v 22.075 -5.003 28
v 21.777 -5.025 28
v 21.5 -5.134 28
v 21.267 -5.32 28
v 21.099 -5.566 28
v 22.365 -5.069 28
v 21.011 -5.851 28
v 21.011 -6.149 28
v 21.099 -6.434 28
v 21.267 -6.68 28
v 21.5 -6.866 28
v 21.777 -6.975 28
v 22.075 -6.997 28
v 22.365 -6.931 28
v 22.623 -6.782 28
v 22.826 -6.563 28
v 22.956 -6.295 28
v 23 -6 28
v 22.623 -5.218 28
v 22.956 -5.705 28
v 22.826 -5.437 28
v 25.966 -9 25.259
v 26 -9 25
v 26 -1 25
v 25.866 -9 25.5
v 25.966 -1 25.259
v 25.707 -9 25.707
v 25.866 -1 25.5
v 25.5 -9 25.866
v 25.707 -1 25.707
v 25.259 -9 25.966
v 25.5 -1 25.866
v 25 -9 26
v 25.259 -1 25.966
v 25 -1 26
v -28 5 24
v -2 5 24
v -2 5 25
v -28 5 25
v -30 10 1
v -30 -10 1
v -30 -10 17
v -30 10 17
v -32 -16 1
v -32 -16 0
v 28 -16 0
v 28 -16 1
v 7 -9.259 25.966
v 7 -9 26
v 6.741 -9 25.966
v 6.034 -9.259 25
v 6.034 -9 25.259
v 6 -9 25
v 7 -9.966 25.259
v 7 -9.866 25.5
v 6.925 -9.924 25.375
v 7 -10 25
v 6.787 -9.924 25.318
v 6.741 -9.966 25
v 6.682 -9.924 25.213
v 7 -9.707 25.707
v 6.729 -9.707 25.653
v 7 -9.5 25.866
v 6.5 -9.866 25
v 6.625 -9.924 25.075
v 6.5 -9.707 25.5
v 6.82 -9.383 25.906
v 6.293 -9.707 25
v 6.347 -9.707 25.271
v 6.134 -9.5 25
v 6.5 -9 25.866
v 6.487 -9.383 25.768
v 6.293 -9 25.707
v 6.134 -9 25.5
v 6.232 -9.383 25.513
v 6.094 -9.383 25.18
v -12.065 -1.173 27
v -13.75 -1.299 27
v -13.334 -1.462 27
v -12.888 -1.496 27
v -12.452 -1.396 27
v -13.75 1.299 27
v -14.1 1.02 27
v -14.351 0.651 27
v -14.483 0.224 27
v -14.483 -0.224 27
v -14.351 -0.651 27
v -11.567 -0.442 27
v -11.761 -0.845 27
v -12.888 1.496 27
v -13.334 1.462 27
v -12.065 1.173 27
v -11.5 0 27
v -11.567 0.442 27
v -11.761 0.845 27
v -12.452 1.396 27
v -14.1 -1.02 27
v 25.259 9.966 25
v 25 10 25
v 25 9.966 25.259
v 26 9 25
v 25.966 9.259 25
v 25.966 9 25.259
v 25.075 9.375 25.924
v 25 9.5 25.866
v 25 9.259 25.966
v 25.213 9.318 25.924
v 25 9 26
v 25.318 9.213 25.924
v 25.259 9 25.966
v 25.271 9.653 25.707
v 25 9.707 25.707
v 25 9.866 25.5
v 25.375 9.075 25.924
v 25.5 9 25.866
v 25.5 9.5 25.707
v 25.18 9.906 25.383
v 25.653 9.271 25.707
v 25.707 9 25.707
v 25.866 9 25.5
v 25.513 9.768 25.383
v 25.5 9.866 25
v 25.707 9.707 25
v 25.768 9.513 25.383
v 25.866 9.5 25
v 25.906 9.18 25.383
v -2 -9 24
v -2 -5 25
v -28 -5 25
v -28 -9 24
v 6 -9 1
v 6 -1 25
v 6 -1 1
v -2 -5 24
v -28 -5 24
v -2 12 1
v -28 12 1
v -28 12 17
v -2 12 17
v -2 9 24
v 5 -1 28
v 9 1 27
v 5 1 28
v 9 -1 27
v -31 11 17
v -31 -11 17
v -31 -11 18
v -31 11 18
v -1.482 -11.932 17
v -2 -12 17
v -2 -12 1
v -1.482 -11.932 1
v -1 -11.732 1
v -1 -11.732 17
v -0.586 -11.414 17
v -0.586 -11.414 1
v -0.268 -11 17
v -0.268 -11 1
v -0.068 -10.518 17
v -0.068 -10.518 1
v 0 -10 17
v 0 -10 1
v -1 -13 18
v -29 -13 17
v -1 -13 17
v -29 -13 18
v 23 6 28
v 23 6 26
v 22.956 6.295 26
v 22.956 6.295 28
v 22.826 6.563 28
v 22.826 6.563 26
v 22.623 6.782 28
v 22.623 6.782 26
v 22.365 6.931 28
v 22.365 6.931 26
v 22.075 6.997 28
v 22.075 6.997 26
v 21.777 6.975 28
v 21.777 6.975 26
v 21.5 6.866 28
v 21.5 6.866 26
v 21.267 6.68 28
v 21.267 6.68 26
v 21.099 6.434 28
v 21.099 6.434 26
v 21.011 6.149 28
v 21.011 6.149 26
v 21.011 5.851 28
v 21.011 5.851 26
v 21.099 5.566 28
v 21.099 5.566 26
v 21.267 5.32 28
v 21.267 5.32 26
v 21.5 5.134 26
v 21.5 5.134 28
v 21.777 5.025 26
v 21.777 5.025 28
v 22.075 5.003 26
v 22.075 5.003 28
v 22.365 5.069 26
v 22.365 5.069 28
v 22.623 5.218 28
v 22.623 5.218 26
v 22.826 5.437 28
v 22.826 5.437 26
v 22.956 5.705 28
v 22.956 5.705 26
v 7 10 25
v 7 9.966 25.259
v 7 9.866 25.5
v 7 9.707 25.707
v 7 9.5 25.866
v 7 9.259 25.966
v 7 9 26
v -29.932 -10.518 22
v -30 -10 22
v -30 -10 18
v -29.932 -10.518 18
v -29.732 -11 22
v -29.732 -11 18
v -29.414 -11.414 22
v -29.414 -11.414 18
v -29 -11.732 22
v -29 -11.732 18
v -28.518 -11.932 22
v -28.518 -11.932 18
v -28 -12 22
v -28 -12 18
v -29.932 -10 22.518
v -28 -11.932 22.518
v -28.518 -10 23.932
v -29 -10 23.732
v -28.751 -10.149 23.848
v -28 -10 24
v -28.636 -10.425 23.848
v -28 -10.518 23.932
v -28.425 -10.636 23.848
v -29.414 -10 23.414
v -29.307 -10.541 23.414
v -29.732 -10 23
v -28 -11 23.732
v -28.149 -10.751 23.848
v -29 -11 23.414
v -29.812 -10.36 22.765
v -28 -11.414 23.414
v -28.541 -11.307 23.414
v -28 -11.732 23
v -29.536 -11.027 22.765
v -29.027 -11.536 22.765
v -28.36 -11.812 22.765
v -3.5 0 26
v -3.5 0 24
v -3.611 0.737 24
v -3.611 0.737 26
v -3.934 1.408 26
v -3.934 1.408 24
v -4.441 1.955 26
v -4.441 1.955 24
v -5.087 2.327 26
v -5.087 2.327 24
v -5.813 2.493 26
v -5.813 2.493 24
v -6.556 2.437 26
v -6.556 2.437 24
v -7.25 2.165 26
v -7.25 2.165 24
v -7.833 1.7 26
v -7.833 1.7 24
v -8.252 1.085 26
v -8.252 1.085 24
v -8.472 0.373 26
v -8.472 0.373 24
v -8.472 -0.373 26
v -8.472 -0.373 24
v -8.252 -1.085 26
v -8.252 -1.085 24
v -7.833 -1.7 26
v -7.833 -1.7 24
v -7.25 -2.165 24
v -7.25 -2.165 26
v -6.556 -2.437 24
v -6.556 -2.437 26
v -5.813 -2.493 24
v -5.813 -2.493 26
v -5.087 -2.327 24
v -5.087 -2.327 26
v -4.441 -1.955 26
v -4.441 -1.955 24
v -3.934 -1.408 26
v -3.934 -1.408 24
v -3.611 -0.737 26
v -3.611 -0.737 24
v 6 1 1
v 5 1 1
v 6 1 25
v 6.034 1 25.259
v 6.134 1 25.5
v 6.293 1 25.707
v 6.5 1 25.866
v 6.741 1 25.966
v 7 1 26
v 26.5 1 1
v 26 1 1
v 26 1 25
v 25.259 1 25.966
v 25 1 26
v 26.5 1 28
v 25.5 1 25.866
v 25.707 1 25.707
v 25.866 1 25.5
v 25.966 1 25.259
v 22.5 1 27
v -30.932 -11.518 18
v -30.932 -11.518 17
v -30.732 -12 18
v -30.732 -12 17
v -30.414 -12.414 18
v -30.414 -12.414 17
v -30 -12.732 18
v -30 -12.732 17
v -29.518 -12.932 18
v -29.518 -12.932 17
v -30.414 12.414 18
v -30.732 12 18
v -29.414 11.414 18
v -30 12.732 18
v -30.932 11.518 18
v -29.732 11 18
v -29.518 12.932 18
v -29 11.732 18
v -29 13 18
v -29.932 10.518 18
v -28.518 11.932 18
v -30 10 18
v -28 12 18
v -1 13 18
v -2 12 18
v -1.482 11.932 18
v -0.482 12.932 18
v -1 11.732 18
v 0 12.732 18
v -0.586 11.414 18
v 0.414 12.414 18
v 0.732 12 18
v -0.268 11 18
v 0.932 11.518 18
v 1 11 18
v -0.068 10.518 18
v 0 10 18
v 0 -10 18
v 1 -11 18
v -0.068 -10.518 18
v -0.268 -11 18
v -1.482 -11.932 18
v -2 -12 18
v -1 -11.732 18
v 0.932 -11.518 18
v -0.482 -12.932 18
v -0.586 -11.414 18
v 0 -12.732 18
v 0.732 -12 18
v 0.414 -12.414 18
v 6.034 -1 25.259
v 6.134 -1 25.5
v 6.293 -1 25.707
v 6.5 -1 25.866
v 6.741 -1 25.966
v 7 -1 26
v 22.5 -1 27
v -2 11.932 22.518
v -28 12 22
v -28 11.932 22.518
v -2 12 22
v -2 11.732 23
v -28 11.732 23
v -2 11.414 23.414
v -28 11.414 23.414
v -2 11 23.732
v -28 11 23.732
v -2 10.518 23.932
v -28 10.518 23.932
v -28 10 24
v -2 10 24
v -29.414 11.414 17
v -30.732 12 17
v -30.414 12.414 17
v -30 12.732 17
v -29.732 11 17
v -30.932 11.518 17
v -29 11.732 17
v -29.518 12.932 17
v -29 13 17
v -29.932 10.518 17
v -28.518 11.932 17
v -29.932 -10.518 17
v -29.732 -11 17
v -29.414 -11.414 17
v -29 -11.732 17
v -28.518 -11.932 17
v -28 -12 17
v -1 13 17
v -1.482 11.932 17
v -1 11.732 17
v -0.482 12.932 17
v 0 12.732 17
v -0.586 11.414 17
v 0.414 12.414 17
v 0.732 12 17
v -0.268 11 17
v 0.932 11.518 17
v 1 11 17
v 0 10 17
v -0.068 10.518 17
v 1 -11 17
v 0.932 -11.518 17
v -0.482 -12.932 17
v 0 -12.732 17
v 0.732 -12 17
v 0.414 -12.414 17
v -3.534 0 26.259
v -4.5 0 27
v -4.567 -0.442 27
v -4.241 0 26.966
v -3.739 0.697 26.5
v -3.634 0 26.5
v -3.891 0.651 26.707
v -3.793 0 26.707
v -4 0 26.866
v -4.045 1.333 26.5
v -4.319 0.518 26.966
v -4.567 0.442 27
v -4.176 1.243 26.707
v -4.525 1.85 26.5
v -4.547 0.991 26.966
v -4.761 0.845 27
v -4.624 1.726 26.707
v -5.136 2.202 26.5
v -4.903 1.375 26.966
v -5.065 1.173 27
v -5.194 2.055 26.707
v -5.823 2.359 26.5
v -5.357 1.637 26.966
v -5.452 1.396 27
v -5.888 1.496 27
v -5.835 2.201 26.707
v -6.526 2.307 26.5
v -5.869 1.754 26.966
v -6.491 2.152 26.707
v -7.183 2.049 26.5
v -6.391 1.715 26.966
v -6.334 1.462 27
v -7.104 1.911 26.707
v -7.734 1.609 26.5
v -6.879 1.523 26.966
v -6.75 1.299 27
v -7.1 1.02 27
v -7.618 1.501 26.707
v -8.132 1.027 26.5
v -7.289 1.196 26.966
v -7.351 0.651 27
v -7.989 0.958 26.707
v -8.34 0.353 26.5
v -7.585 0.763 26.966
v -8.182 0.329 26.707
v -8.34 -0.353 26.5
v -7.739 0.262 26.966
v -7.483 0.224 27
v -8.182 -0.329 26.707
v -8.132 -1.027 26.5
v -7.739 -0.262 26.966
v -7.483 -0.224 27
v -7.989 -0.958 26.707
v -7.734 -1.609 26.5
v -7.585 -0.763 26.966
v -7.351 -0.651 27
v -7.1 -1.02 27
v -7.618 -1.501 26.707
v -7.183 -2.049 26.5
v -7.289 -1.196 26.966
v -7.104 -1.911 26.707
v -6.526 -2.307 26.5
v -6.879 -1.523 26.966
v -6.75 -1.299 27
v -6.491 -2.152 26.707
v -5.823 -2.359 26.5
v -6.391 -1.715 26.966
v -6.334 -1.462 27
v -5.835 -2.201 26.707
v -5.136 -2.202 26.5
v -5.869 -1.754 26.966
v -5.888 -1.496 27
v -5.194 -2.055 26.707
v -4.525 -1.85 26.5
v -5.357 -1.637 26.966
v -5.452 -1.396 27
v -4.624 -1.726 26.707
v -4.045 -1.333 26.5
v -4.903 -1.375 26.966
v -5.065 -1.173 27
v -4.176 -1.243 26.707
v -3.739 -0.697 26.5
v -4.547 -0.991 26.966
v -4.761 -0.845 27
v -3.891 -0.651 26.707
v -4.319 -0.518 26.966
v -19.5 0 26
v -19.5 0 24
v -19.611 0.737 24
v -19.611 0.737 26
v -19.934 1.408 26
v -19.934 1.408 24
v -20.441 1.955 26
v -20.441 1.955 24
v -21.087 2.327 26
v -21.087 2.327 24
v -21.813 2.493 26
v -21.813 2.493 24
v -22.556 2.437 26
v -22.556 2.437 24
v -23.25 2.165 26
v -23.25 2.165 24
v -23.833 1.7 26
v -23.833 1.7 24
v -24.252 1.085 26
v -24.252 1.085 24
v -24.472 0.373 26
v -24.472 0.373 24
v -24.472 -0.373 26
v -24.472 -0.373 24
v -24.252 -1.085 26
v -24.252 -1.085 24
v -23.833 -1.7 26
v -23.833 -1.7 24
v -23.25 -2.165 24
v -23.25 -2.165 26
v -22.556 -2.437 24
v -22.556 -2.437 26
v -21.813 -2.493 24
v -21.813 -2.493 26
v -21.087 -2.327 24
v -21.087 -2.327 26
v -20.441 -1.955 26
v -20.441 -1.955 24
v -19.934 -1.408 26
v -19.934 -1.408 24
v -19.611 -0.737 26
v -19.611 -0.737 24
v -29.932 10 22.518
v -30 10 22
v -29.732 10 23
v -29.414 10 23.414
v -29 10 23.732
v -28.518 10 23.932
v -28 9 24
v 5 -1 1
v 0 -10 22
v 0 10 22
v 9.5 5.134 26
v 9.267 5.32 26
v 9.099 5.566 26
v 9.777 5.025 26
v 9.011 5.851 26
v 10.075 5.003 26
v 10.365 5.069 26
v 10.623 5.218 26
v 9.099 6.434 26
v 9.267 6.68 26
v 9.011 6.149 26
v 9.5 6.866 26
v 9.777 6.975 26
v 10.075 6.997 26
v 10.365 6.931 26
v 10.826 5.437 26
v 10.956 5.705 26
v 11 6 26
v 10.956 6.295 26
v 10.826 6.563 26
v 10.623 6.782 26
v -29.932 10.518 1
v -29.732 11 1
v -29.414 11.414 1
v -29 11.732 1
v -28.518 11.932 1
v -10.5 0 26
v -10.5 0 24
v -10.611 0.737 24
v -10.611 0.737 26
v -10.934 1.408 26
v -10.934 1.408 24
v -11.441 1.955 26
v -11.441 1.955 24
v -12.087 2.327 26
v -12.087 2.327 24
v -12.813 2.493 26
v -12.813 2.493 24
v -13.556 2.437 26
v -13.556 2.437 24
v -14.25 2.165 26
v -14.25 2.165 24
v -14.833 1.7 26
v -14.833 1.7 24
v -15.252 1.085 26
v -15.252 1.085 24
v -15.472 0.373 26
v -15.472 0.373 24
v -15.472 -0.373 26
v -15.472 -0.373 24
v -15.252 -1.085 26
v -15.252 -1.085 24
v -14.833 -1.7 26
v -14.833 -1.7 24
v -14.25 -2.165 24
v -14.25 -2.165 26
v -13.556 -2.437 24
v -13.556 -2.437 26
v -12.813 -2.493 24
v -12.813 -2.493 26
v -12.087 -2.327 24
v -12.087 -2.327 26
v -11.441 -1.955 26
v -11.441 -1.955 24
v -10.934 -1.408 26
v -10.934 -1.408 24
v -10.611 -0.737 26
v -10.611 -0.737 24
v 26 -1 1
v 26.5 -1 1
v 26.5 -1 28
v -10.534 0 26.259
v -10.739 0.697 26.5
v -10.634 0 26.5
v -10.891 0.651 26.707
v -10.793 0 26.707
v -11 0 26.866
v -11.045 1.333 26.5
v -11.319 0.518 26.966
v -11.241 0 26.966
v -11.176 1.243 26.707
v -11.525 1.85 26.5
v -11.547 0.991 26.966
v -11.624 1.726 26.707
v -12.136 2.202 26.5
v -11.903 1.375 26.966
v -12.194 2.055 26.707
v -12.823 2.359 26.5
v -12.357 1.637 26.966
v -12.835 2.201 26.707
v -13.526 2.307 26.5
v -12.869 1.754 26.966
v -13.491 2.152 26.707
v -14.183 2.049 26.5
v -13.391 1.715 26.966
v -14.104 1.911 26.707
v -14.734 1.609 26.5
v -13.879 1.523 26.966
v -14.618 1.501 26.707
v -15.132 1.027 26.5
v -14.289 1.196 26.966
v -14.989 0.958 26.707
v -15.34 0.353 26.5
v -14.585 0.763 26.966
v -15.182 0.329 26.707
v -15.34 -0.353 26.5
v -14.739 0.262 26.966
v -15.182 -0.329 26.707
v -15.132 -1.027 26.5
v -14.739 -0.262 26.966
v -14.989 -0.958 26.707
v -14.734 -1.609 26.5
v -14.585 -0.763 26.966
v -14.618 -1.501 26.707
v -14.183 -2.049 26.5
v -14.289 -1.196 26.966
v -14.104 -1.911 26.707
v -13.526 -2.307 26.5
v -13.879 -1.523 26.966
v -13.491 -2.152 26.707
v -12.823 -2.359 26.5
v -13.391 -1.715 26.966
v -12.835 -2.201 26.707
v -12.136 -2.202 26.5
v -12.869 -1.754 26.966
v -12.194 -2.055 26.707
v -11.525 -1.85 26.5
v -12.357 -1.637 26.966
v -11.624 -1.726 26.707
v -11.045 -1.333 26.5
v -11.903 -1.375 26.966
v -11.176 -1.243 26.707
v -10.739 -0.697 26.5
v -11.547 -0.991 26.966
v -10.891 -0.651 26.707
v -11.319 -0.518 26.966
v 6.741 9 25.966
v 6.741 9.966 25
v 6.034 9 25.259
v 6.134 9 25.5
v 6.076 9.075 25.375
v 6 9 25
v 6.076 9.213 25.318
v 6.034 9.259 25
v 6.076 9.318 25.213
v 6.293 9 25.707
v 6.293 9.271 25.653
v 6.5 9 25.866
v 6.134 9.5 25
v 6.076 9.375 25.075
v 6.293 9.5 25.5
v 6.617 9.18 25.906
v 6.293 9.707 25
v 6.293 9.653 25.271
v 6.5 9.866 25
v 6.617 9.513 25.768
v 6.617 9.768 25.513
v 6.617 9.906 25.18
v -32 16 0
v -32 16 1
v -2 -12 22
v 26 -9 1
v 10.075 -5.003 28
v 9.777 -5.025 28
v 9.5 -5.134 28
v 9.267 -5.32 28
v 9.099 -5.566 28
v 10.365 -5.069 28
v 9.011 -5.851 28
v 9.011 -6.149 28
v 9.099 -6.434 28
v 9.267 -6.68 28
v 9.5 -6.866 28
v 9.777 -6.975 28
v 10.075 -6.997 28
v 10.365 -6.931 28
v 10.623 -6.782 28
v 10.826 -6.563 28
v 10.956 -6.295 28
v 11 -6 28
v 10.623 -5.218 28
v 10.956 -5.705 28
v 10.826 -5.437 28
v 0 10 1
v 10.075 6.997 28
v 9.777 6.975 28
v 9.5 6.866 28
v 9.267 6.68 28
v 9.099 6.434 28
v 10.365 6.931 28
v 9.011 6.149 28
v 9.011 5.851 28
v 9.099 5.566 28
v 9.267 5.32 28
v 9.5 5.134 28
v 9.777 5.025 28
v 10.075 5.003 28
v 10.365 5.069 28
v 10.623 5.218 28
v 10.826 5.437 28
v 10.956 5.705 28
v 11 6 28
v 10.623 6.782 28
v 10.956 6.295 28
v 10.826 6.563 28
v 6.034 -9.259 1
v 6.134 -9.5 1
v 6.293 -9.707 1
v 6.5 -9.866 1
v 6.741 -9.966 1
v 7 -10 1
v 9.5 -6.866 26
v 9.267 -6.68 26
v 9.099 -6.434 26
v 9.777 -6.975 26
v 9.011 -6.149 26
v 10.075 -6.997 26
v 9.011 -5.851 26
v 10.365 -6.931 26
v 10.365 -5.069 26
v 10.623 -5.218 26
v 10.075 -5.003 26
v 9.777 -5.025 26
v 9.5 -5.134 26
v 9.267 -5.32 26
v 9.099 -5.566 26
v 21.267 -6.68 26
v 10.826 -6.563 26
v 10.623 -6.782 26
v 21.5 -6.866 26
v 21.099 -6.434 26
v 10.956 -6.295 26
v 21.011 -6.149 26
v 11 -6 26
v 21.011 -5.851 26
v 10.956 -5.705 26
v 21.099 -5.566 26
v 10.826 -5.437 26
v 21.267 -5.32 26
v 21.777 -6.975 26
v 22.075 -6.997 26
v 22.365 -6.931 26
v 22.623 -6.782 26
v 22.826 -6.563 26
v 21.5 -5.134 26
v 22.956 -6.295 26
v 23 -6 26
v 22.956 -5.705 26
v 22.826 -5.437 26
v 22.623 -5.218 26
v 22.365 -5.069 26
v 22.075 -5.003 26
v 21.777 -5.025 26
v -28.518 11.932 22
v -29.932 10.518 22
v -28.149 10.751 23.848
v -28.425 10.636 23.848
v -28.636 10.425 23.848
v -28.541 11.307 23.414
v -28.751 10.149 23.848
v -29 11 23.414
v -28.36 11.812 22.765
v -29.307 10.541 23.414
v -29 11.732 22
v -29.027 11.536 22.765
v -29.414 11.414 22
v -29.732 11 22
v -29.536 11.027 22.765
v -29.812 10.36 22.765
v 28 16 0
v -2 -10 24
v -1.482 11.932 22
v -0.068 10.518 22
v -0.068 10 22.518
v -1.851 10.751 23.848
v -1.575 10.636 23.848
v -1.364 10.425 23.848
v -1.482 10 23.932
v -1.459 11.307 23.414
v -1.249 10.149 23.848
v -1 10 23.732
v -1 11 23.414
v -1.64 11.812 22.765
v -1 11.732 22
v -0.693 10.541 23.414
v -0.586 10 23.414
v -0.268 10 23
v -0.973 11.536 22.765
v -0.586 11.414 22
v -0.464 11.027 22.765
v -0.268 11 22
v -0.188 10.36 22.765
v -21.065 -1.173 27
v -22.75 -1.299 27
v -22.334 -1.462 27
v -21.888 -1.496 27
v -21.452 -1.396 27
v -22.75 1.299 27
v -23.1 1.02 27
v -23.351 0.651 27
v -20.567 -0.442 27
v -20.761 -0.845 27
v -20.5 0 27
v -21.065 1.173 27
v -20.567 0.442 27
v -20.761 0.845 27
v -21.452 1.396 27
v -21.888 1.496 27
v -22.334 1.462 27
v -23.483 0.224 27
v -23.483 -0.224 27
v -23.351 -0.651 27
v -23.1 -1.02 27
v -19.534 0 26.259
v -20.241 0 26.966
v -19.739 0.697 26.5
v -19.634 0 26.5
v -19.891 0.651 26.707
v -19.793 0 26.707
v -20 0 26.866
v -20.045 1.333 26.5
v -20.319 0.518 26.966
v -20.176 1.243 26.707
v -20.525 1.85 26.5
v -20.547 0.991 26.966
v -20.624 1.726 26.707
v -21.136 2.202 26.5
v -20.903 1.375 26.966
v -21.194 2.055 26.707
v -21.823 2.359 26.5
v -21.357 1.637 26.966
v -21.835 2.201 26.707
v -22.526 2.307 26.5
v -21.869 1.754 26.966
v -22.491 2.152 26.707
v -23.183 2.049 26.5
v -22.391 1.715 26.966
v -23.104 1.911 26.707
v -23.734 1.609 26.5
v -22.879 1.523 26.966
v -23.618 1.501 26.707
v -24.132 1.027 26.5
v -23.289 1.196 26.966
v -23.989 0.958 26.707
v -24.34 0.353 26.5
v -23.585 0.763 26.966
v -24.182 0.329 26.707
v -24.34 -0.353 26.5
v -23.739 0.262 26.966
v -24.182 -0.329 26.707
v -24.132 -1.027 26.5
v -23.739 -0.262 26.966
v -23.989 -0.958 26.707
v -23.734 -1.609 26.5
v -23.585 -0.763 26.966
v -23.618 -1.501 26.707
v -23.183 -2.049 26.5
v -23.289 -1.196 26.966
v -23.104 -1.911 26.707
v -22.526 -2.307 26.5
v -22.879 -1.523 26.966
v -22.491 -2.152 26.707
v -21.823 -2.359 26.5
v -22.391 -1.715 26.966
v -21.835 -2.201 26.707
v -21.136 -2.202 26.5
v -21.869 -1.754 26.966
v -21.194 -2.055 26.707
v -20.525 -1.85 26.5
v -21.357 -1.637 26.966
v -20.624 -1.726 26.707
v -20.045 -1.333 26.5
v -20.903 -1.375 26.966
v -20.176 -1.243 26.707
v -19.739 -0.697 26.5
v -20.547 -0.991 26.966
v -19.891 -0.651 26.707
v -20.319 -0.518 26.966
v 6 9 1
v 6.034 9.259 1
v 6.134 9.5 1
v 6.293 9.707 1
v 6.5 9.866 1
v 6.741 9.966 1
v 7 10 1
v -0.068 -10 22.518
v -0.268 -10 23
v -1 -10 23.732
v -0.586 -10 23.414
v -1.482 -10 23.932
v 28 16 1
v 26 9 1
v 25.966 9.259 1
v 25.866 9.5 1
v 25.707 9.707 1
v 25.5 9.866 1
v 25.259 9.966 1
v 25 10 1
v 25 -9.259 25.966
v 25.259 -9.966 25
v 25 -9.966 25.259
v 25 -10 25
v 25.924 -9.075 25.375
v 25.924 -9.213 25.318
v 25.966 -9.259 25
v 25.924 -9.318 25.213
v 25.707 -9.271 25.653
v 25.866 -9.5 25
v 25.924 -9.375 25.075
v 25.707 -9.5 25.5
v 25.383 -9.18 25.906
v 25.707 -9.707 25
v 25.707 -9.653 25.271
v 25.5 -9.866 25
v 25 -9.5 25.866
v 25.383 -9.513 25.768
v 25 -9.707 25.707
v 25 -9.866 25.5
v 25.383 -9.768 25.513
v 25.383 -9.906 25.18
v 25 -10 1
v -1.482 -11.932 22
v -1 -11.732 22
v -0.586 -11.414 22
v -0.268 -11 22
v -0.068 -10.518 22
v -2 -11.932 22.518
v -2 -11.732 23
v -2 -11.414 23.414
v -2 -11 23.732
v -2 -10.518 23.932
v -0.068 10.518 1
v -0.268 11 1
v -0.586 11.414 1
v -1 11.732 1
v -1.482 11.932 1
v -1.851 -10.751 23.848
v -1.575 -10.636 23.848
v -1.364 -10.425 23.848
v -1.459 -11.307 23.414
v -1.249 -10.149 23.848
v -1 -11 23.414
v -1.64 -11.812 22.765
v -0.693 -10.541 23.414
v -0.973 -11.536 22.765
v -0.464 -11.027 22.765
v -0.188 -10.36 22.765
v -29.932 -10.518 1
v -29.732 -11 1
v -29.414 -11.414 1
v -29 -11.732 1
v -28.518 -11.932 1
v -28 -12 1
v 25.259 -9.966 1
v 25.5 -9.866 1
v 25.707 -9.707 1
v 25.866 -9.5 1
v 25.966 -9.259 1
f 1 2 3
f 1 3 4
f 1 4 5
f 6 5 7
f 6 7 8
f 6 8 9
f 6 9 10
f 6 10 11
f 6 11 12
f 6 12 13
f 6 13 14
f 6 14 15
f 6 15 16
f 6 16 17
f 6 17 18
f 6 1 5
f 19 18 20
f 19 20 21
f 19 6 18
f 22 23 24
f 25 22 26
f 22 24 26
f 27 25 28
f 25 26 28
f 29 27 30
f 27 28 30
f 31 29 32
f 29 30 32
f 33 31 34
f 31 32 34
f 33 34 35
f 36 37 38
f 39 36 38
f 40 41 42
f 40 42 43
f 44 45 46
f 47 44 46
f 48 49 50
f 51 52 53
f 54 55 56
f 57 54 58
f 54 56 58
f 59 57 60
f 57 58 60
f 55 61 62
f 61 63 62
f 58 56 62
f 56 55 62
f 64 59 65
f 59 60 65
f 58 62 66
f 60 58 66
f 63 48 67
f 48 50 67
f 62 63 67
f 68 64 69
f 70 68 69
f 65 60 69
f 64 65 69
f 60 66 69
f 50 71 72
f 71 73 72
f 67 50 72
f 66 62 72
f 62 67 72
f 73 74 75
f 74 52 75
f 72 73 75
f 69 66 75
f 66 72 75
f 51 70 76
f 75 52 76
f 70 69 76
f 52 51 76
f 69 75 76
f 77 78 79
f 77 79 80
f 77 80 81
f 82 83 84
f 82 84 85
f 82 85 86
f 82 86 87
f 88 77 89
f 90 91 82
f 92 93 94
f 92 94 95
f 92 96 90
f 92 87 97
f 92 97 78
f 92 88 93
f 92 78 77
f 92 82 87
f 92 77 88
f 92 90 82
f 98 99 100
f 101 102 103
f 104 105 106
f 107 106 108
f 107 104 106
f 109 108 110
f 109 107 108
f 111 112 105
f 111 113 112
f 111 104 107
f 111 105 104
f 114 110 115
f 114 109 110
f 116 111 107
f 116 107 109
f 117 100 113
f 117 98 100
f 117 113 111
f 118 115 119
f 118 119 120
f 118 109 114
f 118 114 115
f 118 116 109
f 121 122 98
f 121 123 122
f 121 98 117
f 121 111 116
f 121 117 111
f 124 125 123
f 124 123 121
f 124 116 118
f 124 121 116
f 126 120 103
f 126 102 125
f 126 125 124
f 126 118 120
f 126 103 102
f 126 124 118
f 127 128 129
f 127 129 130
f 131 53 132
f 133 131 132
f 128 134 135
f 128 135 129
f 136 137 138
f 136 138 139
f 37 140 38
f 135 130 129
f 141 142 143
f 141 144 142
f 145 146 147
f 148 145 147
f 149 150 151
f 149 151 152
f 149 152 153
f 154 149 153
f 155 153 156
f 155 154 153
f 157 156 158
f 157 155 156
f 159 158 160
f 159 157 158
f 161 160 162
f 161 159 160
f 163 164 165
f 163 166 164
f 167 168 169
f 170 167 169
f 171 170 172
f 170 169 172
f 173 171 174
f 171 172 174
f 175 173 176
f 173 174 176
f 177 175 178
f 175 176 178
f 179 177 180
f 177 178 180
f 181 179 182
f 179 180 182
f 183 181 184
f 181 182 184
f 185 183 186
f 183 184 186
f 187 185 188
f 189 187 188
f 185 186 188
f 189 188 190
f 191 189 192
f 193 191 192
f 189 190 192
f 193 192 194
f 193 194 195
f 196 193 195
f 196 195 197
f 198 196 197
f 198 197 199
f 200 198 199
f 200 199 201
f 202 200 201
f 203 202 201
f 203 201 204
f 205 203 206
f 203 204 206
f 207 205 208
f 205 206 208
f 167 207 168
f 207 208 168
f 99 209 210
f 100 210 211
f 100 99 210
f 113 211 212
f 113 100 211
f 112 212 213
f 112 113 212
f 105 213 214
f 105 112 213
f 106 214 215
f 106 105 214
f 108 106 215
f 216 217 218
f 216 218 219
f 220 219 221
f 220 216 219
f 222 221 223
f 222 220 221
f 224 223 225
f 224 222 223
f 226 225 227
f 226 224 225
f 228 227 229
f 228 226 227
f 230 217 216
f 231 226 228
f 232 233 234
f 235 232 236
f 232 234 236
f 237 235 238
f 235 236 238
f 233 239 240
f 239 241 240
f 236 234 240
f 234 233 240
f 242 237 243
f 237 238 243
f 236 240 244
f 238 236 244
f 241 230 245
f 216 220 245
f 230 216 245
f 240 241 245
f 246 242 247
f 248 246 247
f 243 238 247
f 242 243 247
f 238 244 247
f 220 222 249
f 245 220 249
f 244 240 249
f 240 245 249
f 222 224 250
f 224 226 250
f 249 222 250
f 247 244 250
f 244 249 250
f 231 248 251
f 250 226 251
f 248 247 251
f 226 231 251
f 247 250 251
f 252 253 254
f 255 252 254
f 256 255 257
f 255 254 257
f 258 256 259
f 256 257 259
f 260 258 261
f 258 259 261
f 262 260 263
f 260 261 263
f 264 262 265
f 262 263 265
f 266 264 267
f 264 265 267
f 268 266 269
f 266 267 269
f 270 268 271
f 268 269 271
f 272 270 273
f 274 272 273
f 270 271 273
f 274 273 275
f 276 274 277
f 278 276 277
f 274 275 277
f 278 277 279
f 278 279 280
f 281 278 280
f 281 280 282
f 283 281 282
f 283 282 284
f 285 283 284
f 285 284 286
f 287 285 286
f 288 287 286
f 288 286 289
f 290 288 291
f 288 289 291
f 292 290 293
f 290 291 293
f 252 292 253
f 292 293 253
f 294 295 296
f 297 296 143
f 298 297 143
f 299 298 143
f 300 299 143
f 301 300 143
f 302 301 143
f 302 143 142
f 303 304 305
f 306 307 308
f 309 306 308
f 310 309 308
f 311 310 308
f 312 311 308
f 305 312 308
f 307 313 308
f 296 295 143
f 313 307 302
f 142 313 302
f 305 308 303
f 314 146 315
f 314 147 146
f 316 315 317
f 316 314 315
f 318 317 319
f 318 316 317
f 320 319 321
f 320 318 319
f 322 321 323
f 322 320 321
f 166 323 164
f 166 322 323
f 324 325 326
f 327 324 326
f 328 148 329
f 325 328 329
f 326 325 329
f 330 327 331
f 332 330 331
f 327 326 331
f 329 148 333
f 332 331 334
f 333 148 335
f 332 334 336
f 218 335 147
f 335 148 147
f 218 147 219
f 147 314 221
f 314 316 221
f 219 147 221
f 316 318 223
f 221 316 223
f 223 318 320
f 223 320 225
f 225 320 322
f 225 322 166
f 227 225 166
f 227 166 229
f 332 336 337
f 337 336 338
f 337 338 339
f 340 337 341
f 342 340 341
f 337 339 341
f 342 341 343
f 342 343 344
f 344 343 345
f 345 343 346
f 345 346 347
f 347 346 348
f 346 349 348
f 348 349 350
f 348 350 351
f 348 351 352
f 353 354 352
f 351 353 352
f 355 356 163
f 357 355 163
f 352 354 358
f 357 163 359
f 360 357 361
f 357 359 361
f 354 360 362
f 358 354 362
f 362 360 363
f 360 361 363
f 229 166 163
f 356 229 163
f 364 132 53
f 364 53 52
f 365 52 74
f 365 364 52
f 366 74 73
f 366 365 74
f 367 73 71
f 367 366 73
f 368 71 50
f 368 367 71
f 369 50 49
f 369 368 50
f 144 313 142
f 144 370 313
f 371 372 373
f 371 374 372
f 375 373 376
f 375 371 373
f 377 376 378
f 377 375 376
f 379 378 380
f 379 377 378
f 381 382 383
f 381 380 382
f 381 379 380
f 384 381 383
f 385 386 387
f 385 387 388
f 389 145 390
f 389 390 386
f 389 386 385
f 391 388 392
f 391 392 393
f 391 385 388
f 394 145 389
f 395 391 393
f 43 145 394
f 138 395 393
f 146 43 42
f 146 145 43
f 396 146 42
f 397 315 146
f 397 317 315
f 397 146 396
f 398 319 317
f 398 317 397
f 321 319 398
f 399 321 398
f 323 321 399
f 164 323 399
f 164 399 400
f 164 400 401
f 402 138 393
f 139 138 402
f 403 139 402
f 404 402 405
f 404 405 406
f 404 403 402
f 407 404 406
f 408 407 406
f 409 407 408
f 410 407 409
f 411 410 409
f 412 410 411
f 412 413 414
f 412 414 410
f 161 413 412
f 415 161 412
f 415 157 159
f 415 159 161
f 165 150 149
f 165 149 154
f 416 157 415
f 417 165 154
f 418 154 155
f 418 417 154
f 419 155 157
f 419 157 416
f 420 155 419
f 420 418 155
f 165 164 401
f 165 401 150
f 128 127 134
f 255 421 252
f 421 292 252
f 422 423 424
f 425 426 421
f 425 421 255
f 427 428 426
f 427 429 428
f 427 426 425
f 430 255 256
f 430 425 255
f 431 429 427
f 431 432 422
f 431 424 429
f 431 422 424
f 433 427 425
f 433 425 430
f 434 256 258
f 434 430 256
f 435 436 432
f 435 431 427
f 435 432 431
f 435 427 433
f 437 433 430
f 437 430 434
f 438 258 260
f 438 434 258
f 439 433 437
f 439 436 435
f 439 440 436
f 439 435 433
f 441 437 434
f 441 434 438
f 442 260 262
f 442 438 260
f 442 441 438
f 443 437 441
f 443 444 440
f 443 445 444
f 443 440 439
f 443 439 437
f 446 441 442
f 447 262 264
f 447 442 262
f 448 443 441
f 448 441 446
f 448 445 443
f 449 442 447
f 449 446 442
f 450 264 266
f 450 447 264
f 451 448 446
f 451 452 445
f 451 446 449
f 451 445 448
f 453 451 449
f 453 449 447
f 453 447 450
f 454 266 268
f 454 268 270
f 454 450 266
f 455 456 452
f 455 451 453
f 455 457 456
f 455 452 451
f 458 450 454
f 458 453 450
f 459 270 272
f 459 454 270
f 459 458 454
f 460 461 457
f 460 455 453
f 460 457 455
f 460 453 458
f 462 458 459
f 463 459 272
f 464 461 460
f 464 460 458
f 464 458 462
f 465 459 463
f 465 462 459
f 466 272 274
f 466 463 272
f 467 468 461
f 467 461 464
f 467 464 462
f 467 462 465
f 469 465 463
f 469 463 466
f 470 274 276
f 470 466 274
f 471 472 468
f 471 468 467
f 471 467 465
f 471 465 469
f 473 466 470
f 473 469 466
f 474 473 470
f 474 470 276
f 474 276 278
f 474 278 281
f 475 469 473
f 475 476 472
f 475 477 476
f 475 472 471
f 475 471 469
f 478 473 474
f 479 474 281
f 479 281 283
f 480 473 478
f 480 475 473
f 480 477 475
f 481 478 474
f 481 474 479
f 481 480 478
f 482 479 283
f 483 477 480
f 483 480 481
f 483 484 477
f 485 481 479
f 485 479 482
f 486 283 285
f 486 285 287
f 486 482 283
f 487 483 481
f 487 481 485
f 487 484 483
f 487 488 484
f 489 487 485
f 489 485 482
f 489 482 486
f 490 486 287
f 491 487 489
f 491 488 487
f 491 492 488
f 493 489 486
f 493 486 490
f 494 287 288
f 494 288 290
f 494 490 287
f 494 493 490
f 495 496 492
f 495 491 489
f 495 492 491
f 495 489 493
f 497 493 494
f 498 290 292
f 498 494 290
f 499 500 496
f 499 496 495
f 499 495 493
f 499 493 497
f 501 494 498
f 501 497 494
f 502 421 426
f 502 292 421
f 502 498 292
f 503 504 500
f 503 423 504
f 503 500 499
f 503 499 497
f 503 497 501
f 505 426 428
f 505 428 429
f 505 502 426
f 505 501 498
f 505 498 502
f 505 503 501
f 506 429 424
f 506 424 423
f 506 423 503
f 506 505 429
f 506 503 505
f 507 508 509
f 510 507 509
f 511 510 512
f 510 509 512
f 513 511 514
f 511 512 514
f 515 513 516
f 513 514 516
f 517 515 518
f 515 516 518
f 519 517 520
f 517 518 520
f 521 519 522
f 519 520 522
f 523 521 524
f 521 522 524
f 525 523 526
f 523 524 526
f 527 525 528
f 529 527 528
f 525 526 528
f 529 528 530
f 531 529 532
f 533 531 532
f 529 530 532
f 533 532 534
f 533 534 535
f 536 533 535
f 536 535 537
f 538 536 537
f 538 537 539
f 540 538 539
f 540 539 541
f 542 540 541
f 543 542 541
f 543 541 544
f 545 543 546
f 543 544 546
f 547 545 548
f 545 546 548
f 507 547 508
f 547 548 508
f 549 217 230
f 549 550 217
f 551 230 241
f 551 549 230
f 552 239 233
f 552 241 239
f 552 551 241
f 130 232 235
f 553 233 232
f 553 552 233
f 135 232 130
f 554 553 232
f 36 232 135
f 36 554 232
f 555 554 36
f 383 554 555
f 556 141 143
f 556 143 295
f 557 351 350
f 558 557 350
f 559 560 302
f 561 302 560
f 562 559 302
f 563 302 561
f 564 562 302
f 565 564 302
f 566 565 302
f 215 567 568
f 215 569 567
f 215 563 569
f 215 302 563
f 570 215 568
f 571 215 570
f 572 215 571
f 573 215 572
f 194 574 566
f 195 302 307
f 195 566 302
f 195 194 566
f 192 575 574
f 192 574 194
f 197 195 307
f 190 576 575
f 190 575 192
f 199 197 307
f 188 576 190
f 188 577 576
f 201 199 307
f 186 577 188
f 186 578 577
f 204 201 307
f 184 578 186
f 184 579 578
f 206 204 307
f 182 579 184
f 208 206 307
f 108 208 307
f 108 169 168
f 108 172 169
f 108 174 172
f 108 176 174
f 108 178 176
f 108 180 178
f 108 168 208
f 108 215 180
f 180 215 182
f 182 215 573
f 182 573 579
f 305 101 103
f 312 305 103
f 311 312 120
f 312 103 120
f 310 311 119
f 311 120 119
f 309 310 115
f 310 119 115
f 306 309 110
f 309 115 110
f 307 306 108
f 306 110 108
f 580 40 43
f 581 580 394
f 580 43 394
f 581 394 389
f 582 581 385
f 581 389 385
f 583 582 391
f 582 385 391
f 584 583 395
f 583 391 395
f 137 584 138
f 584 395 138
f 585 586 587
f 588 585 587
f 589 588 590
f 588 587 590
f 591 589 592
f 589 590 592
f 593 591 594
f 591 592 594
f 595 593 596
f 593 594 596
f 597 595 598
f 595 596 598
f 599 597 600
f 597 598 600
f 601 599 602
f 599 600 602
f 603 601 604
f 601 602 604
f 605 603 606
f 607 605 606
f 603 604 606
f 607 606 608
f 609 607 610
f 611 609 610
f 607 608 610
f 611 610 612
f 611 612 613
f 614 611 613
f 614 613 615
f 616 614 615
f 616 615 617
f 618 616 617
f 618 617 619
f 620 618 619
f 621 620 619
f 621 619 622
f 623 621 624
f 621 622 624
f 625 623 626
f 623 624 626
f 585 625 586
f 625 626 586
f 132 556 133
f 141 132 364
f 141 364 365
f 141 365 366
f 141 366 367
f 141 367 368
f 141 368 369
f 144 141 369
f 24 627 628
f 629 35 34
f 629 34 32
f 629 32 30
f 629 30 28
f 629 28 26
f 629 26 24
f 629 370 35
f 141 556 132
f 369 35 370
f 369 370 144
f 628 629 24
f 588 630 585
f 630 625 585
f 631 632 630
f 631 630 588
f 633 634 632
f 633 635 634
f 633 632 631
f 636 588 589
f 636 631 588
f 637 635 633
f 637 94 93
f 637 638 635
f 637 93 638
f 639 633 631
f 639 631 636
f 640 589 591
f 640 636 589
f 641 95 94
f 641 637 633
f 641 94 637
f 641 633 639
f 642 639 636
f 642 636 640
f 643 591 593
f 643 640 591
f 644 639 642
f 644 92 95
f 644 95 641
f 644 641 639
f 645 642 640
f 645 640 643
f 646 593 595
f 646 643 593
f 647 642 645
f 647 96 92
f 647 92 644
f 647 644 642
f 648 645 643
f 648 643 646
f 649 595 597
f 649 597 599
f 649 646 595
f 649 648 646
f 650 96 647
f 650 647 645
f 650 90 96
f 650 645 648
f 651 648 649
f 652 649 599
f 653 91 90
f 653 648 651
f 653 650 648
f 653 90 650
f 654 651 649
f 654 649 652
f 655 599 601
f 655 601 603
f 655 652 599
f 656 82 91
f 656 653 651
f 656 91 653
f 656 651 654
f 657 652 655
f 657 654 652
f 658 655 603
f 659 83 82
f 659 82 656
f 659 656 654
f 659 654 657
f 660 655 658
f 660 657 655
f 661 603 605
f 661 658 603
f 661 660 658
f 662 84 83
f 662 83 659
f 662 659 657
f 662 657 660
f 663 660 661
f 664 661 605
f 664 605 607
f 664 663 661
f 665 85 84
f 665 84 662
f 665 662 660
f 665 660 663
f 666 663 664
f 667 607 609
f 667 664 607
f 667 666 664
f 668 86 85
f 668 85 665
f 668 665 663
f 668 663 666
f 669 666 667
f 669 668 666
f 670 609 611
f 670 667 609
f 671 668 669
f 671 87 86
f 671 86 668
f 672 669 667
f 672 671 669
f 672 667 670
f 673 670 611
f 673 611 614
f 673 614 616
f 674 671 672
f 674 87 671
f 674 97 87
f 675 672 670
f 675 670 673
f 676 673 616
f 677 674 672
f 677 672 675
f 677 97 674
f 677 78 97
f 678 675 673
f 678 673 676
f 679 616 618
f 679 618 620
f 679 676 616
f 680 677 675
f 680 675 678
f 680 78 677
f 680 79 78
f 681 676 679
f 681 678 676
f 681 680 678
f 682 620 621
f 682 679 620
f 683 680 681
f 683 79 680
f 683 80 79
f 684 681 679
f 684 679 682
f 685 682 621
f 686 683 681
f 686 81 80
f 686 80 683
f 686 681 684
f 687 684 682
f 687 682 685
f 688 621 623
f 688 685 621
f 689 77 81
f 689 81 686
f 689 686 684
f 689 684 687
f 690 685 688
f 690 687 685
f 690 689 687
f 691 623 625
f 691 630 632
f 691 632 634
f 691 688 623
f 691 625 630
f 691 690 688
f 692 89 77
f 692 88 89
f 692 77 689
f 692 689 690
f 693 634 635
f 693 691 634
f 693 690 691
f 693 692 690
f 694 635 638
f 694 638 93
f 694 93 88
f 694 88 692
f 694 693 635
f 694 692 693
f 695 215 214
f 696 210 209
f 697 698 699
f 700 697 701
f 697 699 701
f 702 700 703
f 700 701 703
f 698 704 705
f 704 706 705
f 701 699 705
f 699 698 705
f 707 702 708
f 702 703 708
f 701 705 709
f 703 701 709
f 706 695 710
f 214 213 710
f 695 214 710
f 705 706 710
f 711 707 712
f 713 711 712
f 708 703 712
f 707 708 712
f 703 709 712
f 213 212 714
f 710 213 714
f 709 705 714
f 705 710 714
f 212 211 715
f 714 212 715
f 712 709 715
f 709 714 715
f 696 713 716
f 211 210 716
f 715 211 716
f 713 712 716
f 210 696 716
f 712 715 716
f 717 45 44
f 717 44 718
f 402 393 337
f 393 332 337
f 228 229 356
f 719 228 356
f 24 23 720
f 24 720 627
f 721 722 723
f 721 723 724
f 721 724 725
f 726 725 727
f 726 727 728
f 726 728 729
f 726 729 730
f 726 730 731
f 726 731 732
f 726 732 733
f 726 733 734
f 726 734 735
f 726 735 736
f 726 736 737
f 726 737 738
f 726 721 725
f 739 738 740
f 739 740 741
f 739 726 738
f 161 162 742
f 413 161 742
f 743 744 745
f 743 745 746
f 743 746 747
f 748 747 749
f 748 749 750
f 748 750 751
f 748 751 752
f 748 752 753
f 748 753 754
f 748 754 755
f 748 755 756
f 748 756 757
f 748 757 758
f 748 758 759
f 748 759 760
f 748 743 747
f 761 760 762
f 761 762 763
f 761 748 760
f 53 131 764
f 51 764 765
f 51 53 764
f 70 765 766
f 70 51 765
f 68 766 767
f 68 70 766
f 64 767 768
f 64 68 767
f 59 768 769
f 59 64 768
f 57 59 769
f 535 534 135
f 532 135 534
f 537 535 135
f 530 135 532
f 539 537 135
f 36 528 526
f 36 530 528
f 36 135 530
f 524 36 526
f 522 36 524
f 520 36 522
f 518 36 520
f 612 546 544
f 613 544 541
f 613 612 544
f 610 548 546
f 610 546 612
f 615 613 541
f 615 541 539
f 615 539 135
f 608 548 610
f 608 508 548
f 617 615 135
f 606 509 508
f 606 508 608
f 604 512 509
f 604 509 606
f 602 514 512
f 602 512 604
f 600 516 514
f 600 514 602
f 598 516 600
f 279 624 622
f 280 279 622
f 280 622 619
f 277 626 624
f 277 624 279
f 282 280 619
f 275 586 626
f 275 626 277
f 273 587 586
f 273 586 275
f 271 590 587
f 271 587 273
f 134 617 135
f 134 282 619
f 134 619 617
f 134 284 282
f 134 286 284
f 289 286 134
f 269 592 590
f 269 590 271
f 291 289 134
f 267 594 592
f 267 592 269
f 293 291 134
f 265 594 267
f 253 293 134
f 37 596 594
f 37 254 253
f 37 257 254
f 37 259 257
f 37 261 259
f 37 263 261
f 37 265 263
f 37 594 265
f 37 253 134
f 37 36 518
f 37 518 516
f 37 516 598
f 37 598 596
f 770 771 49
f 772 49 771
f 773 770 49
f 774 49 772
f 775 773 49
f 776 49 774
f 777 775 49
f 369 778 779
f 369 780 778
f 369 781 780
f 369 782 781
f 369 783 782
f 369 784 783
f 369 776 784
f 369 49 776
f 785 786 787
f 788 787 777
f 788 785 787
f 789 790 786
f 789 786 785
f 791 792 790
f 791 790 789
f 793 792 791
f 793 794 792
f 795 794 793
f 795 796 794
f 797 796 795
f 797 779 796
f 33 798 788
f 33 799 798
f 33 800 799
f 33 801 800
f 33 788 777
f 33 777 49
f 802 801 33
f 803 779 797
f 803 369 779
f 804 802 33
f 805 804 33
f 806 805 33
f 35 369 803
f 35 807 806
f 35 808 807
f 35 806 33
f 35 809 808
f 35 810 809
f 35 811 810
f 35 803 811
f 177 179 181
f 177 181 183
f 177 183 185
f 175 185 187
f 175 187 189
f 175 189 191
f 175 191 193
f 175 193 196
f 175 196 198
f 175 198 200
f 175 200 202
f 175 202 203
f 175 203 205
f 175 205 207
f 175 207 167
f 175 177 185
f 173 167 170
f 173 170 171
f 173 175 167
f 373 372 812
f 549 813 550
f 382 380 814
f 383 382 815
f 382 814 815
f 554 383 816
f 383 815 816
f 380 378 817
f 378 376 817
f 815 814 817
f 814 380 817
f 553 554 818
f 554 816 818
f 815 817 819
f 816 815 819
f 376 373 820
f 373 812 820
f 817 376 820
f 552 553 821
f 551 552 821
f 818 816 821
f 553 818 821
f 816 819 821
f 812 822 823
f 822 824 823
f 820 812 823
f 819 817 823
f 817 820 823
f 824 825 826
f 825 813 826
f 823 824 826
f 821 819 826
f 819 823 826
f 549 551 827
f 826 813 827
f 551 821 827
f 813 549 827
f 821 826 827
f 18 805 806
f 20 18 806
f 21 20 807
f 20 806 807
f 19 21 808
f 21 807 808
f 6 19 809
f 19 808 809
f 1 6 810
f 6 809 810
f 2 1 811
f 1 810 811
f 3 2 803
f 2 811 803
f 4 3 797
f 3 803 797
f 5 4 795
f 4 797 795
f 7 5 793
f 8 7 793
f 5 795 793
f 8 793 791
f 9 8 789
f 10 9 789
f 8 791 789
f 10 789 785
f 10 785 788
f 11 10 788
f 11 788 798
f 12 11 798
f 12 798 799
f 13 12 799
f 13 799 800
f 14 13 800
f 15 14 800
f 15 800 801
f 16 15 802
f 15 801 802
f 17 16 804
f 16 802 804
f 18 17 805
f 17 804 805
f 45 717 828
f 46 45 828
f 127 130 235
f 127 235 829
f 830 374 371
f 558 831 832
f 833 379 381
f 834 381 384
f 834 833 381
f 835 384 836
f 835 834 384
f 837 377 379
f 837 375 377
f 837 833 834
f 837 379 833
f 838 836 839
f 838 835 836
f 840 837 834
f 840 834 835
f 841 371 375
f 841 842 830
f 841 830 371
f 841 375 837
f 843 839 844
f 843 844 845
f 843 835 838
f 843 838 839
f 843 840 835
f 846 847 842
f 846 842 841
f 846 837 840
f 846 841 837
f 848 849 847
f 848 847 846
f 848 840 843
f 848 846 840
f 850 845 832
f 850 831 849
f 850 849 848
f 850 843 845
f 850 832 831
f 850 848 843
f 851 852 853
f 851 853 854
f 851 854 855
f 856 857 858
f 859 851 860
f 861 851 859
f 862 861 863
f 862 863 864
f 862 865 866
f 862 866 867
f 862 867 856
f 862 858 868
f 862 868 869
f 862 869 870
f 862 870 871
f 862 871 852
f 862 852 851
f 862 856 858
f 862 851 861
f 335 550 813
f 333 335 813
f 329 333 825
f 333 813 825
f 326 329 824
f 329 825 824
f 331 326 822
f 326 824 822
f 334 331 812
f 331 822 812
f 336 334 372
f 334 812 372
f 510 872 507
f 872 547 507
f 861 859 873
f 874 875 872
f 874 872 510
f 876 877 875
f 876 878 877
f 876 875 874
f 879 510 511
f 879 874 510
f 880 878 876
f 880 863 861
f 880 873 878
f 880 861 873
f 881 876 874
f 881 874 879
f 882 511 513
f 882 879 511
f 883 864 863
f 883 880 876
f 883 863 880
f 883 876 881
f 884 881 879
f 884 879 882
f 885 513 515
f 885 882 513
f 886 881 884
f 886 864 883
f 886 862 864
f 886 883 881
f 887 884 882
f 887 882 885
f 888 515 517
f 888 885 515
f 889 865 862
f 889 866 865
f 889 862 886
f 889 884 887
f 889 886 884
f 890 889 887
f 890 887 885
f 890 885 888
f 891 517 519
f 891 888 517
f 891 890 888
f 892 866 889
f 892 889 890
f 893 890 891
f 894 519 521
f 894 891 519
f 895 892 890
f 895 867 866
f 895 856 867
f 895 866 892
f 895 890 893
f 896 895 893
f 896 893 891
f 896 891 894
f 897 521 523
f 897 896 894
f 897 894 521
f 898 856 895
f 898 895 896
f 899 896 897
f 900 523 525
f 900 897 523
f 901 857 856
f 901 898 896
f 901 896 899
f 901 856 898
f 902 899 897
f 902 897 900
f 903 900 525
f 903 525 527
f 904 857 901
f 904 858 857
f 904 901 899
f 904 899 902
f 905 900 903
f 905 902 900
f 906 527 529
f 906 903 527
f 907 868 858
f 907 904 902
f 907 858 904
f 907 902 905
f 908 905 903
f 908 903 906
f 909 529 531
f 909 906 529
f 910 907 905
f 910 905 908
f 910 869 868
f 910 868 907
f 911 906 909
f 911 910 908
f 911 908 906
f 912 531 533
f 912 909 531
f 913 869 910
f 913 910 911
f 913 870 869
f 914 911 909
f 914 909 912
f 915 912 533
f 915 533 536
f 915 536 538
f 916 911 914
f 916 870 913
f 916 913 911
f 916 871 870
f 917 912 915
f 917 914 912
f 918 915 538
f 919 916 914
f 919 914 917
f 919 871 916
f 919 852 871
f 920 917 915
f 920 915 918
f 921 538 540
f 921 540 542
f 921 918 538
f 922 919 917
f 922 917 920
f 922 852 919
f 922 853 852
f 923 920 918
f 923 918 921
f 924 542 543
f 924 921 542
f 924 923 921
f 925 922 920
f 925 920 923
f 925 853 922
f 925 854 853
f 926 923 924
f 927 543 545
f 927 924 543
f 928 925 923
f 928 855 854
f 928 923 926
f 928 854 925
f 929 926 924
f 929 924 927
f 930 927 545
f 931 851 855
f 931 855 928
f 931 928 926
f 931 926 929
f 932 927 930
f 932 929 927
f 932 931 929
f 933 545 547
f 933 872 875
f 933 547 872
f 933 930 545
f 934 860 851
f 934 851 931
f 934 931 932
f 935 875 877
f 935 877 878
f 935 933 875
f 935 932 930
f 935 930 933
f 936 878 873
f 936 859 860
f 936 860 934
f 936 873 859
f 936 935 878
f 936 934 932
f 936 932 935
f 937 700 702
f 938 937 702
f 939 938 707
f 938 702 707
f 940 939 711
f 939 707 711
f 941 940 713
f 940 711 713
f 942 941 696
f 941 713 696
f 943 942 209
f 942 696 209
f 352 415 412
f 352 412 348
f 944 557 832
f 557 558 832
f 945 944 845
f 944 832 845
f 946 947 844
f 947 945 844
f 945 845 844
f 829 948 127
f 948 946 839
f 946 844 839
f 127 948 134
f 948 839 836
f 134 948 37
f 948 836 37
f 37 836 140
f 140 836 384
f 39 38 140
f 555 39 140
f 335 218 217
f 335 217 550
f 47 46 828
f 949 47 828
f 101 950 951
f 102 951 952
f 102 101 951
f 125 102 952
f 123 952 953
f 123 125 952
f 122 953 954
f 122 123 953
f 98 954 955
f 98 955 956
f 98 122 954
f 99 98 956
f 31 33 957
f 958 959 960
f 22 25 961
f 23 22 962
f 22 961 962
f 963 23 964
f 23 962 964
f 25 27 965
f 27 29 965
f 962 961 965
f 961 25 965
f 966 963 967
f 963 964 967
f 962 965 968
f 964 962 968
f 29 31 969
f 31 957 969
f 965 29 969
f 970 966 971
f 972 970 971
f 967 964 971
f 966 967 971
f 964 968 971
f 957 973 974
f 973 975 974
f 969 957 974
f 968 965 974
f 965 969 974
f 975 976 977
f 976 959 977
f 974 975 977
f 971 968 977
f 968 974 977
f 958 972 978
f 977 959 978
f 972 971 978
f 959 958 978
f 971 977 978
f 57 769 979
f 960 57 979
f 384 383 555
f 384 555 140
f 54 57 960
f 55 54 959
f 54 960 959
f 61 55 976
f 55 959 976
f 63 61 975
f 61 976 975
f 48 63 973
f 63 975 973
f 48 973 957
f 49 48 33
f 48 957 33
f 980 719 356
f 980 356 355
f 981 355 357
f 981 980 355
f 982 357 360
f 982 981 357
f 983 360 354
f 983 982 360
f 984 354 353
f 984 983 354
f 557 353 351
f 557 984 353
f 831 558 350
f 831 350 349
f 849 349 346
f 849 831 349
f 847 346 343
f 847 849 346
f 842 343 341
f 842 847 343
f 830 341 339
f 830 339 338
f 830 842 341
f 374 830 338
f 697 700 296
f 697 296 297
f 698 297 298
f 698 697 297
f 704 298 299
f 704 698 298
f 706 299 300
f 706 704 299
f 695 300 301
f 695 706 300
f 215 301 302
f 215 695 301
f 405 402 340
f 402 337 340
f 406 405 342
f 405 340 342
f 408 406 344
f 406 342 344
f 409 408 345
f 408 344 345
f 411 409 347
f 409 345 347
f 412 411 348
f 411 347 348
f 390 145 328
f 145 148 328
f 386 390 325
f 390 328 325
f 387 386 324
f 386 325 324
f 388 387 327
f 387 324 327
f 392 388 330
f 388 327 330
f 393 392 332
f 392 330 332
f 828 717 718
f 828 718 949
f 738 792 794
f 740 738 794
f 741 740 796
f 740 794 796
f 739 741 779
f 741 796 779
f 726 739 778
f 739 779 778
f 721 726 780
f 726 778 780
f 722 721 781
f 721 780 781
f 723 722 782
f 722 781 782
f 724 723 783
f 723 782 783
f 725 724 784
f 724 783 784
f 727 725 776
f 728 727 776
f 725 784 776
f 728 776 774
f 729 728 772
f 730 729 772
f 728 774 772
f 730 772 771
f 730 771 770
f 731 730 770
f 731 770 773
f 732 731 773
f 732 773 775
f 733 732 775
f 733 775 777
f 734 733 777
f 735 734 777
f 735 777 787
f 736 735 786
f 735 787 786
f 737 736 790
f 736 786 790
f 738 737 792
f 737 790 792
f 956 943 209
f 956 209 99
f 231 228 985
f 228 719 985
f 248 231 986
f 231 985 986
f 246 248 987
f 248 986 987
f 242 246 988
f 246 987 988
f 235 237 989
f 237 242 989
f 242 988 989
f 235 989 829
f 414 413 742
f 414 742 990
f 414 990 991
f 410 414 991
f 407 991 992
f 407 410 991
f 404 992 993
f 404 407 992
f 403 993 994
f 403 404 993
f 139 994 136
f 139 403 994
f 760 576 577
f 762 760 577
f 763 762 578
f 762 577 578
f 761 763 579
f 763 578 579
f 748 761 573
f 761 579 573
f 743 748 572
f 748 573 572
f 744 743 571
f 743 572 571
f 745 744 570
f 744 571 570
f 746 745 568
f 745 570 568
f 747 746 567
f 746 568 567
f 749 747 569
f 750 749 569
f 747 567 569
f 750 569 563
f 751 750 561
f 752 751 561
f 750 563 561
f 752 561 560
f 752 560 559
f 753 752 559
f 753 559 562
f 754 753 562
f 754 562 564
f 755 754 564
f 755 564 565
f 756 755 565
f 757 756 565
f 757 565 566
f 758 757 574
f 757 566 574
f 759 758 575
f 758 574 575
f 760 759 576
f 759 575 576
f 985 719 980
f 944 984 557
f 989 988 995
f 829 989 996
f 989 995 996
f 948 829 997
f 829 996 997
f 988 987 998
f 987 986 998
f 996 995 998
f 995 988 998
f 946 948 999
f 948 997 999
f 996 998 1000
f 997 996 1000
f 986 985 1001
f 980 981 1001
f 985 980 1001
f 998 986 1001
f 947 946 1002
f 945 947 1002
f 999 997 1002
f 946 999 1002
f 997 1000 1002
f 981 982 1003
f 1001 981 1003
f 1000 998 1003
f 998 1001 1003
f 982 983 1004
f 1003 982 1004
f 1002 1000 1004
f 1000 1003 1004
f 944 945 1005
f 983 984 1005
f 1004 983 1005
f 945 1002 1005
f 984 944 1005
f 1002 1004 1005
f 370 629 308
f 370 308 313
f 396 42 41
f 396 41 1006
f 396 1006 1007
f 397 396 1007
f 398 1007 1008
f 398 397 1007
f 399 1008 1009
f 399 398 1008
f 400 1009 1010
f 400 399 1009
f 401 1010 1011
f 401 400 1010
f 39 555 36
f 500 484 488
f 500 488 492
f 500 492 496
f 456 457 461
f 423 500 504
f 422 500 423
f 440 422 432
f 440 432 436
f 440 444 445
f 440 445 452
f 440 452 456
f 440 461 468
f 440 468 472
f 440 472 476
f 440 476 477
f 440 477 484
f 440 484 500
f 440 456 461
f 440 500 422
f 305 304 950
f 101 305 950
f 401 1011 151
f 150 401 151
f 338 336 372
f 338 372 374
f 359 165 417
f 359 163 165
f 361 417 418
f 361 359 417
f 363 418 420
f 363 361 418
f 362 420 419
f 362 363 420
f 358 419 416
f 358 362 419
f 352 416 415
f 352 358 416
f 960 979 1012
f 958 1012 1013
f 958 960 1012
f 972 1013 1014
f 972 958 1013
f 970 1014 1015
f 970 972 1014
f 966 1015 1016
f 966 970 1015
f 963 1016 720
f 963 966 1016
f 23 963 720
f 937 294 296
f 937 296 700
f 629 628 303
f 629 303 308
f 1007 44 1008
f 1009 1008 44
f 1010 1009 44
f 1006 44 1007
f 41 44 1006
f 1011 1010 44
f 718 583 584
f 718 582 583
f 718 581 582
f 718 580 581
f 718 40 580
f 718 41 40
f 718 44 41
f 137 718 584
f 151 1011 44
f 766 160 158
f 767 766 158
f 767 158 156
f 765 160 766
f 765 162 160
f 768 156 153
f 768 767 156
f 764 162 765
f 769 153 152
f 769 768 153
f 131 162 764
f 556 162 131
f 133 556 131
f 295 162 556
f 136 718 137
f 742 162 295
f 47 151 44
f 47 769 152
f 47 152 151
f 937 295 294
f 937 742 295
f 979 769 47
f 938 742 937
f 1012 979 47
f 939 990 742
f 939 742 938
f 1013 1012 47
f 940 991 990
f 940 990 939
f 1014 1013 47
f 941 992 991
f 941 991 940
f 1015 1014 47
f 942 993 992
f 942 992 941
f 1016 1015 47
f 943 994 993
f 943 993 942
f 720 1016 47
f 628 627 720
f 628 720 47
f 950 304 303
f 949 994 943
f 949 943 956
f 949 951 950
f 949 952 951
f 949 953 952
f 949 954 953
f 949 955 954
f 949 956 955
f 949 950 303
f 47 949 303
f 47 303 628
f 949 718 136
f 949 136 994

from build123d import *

# Parameters (mm, degrees)
F1_W      = 30
F1_H      = 24
F2_DEPTH  = 24
F3_R      = 2
F4_W      = 32
F4_H      = 1
F5_DEPTH  = 13
F6_R      = 2
F7_R      = 2.5
F8_DEPTH  = 3
F9_R      = 1
F11_DEPTH = 26
F13_W     = 20
F13_H     = 20
F14_DEPTH = 26
F15_R     = 1
F16_R     = 1
F17_DEPTH = 2
F19_DEPTH = 1
F20_W     = 60
F20_H     = 32
F21_DEPTH = 1


with BuildPart() as f2:
    # F1 (on Top) → F2 (new body)
    with BuildSketch(Plane.XY):
        with Locations((-15, 0)):
            Rectangle(F1_W, F1_H)
    extrude(amount=F2_DEPTH)

    # F3
    f3_edges = [f2.edges().sort_by_distance(p)[0] for p in [
        (-30, 12, 12),
        (0, 12, 12),
        (-30, -12, 12),
        (0, -12, 12),
        (-15, 12, 24),
        (-30, 0, 24),
        (-15, -12, 24),
        (0, 0, 24),
    ]]
    fillet(f3_edges, radius=F3_R)

    # F4 (on Front) → F5 (join, symmetric)
    with BuildSketch(Plane.XZ):
        with Locations((-15, 17.5)):
            Rectangle(F4_W, F4_H)
    extrude(amount=F5_DEPTH, both=True)

    # F6
    f6_edges = [f2.edges().sort_by_distance(p)[0] for p in [
        (-31, 13, 17.5),
        (-31, -13, 17.5),
        (1, 13, 17.5),
        (1, -13, 17.5),
    ]]
    fillet(f6_edges, radius=F6_R)

    # F7 (on face) → F8 (join)
    with BuildSketch(Plane.XY.offset(24)):
        with Locations((-22, 0)):
            Circle(F7_R)
        with Locations((-13, 0)):
            Circle(F7_R)
        with Locations((-6, 0)):
            Circle(F7_R)
    extrude(amount=F8_DEPTH)

    # F9
    f9_edges = [f2.edges().sort_by_distance(p)[0] for p in [
        (-24.5, 0, 27),
        (-15.5, 0, 27),
        (-8.5, 0, 27),
    ]]
    fillet(f9_edges, radius=F9_R)

    # F10 (on offset) → F11 (join)
    with BuildSketch(Plane.YZ.offset(-2)):
        Polygon((-9, 24), (-5, 24), (-5, 25), align=None)
    extrude(amount=-F11_DEPTH)

    # F12: F2 across plane


with BuildPart() as f2_1:
    add(f2.part)
    add(f2.part.mirror(Plane.XZ))



with BuildPart() as f14:
    # F13 (on Top) → F14 (new body)
    with BuildSketch(Plane.XY):
        with Locations((16, 0)):
            Rectangle(F13_W, F13_H)
    extrude(amount=F14_DEPTH)

    # F15
    f15_edges = [f14.edges().sort_by_distance(p)[0] for p in [
        (26, 10, 13),
        (16, 10, 26),
        (6, 0, 26),
        (16, -10, 26),
        (26, 0, 26),
        (26, -10, 13),
        (6, 10, 13),
        (6, -10, 13),
    ]]
    fillet(f15_edges, radius=F15_R)

    # F16 (on face) → F17 (join)
    with BuildSketch(Plane.XY.offset(26)):
        with Locations((10, 6)):
            Circle(F16_R)
        with Locations((22, 6)):
            Circle(F16_R)
        with Locations((10, -6)):
            Circle(F16_R)
        with Locations((22, -6)):
            Circle(F16_R)
    extrude(amount=F17_DEPTH)

    # F18 (on Front) → F19 (join, symmetric)
    with BuildSketch(Plane.XZ):
        Polygon((5, 28), (5, 0), (26.5, 0), (26.5, 28), (22.5, 27), (9, 27), align=None)
    extrude(amount=F19_DEPTH, both=True)


with BuildPart() as f2_2:
    add(f2_1.part)

    add(f14.part)  # F21 merges F14
    # F20 (on Top) → F21 (join)
    with BuildSketch(Plane.XY):
        with Locations((-2, 0)):
            Rectangle(F20_W, F20_H)
    extrude(amount=F21_DEPTH)


solid = f2_2.part
